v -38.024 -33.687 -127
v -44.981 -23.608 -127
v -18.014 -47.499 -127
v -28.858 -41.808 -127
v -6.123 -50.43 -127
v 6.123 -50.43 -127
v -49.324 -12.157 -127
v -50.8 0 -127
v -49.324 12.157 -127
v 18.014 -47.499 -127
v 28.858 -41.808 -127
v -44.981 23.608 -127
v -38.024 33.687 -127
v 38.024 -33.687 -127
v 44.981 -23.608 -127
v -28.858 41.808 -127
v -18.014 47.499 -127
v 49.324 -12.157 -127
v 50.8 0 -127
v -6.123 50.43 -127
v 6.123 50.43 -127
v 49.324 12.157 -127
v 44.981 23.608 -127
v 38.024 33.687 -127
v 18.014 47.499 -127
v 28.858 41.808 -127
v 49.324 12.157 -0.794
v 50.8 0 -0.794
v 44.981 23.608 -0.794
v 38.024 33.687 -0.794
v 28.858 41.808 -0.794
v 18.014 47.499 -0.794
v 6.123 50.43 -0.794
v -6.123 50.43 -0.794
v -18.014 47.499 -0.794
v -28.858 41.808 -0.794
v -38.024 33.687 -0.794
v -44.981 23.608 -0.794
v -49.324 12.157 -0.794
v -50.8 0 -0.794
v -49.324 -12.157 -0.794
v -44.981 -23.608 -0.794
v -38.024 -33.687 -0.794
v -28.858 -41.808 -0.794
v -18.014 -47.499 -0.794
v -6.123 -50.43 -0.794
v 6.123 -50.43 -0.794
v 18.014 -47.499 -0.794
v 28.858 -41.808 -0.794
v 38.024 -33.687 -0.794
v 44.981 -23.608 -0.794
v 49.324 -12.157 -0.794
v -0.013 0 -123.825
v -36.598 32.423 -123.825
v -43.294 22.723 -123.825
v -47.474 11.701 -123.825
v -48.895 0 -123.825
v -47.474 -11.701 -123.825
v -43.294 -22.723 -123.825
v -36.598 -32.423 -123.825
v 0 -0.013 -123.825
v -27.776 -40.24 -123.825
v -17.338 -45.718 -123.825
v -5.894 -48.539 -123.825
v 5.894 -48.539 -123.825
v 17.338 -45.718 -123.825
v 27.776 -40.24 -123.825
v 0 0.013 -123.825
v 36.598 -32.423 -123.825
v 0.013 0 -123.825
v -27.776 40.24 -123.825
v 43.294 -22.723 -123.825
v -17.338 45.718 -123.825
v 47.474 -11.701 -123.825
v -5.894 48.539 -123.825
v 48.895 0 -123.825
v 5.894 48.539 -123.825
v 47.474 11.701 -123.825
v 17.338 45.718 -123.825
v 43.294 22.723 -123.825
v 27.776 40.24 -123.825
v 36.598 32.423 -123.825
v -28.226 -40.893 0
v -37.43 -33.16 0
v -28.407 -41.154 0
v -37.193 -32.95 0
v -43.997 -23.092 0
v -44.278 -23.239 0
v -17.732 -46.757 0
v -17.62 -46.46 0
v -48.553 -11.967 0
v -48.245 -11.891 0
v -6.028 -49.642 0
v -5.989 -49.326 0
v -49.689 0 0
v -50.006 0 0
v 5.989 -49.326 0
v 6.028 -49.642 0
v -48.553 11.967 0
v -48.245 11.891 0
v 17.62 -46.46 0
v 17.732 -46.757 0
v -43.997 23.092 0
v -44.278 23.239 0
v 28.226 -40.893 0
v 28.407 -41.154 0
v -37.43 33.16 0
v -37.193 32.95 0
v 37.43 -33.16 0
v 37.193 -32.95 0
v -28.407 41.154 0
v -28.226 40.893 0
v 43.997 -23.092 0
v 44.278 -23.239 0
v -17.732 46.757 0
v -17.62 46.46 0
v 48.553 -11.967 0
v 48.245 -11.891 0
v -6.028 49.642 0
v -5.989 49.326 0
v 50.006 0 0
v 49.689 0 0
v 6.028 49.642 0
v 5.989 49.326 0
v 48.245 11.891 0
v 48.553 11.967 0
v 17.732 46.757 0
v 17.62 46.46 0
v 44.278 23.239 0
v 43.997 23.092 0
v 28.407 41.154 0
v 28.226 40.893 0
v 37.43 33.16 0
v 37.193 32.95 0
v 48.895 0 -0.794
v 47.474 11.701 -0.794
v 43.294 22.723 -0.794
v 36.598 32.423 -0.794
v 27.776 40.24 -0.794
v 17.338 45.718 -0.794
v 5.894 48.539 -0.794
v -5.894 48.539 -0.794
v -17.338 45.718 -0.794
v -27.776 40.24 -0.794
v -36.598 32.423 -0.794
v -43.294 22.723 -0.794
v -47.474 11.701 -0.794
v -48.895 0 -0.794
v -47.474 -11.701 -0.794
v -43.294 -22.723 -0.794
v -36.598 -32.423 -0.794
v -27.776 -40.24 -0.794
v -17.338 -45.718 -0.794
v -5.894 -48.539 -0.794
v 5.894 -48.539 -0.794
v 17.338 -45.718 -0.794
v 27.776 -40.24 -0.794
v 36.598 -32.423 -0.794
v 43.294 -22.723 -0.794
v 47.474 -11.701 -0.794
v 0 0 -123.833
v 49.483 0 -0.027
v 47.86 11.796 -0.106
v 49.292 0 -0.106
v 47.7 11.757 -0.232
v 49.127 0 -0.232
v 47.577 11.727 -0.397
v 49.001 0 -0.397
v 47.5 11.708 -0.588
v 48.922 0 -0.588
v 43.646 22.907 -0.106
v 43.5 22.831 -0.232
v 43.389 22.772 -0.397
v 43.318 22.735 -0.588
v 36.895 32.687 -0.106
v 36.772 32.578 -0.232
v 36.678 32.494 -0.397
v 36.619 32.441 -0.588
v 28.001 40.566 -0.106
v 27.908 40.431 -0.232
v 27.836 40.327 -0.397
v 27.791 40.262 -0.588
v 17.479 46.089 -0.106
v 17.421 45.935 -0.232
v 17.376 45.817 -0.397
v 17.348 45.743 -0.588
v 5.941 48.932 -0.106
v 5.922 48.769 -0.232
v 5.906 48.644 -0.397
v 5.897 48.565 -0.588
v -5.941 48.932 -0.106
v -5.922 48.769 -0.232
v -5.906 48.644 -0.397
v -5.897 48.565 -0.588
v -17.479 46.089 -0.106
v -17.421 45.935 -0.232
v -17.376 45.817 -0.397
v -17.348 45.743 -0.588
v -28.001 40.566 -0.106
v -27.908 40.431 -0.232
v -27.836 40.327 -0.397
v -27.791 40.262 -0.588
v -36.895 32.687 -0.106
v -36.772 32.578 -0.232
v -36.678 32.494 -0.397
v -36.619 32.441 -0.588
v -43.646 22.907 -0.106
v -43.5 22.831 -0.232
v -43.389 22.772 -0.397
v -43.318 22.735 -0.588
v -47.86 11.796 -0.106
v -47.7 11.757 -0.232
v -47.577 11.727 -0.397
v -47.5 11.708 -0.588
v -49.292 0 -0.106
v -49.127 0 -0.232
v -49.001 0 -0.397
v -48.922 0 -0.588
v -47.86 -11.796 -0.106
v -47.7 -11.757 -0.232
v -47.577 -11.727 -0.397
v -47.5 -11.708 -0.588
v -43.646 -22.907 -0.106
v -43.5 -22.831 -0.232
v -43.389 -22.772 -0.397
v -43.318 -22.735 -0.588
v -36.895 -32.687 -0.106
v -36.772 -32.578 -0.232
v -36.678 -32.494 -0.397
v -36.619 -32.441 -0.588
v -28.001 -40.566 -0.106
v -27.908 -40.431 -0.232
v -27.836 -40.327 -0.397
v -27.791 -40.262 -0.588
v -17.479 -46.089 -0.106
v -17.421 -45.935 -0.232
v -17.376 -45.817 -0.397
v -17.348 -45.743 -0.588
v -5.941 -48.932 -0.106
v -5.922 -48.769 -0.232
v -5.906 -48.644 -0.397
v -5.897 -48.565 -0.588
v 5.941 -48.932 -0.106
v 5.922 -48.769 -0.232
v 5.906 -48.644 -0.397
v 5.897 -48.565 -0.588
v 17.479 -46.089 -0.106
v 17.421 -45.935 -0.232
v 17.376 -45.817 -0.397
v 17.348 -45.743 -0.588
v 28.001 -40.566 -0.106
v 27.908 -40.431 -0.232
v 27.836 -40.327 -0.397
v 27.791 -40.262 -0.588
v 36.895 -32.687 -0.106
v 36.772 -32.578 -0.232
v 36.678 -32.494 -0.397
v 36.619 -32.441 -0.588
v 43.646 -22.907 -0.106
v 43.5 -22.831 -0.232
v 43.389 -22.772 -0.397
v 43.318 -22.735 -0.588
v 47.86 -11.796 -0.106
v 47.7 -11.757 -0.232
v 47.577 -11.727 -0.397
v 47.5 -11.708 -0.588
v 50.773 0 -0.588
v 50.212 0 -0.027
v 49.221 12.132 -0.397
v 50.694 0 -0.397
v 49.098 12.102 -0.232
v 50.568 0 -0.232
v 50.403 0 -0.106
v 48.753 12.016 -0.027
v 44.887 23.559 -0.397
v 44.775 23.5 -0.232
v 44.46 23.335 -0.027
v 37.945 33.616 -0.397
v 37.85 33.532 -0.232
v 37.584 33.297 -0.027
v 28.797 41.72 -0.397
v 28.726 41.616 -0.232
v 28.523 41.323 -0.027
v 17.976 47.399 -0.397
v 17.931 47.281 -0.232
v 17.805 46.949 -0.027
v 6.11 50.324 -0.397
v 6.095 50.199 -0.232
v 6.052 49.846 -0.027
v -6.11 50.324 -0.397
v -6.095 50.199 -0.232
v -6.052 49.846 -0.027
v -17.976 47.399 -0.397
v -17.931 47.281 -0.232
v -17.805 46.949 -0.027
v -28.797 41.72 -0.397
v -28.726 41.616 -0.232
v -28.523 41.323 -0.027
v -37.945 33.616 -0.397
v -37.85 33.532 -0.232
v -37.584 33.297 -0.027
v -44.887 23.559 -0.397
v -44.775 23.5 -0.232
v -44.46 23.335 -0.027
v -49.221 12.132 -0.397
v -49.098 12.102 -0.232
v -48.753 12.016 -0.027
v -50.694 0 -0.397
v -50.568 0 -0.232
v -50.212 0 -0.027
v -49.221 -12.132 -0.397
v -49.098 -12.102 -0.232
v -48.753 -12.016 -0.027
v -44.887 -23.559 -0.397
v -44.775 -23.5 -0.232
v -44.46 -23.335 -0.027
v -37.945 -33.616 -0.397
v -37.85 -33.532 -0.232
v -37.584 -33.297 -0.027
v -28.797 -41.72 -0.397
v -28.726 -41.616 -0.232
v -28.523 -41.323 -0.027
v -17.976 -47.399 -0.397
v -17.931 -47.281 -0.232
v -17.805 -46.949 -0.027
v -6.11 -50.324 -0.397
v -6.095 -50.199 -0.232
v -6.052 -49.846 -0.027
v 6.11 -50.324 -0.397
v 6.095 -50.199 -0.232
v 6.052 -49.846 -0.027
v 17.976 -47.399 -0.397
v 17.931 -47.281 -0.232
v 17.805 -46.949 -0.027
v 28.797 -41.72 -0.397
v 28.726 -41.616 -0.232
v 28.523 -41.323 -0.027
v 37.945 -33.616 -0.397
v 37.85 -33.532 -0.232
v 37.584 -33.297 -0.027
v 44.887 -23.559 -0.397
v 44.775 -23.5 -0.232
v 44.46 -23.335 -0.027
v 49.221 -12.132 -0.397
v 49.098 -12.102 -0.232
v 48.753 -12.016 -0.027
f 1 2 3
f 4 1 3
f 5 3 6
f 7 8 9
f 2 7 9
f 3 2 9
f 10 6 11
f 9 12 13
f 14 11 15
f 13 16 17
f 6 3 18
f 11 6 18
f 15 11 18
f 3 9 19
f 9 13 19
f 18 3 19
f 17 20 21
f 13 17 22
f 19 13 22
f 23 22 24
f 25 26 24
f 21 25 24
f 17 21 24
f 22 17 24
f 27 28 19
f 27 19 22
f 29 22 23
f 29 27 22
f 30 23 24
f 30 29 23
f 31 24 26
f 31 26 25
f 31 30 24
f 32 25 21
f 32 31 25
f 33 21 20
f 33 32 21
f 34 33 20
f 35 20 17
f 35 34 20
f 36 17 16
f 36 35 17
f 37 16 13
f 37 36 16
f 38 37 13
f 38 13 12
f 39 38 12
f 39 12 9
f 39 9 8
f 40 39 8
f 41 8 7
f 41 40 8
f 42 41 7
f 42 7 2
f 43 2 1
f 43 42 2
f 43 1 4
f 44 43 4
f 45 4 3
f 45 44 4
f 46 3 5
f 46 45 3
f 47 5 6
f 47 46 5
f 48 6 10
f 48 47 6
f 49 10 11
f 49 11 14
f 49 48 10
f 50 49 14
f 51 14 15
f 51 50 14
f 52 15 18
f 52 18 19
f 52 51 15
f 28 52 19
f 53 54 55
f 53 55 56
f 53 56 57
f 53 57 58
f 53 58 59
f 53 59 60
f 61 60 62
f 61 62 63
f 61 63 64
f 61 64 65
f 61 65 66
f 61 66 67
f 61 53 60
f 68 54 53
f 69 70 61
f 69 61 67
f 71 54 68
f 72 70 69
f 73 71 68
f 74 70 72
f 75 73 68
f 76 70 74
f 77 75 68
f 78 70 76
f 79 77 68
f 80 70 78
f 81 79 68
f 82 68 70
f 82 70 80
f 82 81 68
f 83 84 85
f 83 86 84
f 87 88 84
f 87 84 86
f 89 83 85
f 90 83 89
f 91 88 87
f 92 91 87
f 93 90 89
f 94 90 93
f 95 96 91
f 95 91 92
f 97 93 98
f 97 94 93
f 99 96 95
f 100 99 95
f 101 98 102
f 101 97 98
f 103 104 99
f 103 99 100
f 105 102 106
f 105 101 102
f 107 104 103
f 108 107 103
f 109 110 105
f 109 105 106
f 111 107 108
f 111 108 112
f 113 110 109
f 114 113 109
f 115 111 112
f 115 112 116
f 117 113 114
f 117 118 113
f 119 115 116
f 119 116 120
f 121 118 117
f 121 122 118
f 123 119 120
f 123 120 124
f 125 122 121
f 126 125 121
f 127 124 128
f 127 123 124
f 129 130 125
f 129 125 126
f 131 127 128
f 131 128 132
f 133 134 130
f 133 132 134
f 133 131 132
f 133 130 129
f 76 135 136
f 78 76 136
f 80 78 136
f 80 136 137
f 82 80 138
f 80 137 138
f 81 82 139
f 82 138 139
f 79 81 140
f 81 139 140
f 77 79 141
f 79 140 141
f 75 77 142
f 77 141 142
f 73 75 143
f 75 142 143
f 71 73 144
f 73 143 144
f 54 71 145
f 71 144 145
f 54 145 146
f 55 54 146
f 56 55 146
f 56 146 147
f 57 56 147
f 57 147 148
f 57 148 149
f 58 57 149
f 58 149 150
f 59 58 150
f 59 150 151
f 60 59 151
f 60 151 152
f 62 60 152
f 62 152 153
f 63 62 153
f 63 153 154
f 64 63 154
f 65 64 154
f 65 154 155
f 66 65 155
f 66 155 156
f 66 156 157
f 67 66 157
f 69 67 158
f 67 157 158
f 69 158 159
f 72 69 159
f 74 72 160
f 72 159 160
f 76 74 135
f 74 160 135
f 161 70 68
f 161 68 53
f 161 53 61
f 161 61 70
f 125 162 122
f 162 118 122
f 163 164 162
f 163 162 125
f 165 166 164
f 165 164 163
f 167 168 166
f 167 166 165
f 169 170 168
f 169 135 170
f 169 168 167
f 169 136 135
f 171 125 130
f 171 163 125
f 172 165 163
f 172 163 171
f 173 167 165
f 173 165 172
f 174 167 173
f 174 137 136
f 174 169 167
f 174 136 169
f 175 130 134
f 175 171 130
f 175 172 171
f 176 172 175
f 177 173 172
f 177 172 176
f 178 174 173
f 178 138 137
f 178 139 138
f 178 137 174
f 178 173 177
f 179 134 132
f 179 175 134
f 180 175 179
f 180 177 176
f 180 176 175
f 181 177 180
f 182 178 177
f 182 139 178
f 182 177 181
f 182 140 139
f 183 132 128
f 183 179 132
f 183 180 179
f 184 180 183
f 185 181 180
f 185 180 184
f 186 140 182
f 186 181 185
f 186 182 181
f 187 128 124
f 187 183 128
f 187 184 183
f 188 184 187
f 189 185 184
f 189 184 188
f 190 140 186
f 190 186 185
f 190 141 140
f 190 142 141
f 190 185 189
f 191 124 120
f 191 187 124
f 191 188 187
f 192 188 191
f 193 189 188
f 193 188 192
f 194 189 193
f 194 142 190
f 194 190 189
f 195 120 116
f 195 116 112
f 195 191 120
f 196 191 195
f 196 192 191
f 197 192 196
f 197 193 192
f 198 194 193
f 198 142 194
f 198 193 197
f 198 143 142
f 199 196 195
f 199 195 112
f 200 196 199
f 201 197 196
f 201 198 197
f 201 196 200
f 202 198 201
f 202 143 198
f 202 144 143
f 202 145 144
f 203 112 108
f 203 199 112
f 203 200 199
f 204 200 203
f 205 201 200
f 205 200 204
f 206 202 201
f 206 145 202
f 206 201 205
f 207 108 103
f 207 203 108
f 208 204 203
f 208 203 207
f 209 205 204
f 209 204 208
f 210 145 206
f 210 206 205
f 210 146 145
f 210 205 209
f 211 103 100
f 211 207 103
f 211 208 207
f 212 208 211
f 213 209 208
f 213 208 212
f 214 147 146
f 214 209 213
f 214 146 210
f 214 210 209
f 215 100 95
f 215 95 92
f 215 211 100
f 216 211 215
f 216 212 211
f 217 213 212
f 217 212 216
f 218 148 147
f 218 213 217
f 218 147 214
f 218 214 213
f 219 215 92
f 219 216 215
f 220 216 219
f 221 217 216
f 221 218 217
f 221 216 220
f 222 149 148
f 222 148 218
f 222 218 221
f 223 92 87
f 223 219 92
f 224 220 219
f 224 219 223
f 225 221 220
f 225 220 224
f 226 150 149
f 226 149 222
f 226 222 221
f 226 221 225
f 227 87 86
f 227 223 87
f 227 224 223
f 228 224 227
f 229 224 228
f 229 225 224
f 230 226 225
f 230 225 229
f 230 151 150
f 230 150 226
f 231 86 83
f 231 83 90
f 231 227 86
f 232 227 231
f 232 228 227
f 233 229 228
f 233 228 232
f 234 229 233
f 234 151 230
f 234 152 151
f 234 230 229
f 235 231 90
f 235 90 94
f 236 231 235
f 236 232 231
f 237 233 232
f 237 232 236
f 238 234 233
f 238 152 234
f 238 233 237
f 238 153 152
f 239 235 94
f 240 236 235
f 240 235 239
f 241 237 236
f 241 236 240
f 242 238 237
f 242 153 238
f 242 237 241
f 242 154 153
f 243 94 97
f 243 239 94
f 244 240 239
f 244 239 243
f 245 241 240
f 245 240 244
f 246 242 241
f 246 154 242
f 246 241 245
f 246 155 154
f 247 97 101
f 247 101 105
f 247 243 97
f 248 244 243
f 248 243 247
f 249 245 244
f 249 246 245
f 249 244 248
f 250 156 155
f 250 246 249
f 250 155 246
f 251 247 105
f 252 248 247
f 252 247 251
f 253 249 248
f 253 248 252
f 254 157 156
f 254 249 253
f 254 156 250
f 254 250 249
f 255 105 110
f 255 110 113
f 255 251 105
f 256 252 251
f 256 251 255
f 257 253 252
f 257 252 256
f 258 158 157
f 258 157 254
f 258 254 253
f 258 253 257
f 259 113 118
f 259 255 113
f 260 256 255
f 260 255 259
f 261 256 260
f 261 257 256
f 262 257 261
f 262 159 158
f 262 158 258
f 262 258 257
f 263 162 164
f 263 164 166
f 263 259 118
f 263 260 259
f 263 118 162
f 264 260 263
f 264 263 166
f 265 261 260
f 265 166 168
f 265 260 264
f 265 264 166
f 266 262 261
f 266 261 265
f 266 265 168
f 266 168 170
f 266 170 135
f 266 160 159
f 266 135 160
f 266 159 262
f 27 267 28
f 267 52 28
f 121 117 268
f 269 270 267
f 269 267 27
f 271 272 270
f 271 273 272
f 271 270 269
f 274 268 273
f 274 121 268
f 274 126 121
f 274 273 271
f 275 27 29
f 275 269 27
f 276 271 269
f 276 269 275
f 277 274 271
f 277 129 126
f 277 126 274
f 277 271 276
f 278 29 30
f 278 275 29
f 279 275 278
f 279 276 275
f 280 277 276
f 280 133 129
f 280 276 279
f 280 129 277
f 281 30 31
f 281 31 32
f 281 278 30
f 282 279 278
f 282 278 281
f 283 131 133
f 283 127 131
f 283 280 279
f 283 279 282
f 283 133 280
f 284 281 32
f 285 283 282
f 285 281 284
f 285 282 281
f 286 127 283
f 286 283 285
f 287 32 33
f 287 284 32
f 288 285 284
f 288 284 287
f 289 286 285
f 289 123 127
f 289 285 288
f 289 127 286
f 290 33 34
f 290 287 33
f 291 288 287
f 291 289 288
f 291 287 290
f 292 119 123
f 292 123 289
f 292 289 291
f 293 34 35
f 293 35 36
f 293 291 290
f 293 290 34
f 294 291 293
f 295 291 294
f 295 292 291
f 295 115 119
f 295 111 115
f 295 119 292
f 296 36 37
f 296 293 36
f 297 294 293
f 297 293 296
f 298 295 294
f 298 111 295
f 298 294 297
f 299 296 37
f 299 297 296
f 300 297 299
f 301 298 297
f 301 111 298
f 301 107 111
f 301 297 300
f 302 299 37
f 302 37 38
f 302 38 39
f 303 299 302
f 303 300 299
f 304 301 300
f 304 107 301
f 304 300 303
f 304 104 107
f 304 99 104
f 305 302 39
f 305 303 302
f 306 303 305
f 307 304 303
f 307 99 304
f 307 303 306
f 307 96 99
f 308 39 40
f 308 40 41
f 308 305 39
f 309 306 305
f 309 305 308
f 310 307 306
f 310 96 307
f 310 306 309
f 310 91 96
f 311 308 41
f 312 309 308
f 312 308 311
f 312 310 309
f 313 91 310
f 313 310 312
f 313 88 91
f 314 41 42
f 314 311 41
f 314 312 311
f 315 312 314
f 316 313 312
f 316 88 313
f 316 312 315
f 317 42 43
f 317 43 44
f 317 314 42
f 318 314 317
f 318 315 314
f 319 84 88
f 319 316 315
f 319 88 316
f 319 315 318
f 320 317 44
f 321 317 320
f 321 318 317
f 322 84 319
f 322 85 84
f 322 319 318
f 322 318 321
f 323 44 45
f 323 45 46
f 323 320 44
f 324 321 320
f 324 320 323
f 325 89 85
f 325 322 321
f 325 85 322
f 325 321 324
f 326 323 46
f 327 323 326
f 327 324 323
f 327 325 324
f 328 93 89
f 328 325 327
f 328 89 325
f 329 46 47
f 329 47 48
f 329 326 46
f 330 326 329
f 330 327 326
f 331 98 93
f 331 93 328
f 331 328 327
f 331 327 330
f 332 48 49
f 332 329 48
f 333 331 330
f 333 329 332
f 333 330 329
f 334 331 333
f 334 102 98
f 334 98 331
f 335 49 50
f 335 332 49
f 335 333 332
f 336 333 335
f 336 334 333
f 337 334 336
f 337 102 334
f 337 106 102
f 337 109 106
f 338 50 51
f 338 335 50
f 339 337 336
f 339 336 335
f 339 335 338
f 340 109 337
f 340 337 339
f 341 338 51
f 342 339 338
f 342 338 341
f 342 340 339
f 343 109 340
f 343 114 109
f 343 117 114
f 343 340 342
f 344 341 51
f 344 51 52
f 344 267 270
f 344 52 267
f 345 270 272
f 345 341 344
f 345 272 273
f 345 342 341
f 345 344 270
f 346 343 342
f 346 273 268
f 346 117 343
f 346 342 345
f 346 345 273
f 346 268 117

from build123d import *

# Parameters (mm, degrees)
F0_R           = 50.8
F1_DEPTH       = 127
F3_D           = 0.0254
F3_DEPTH       = 123.825
F3_CBORE_D     = 97.79
F3_CBORE_DEPTH = 123.825
F3_TIP         = 0.0076309299
F4_R           = 0.79375


with BuildPart() as f1:
    # F0 (on Top) → F1 (new body)
    with BuildSketch(Plane.XY):
        Circle(F0_R)
    extrude(amount=-F1_DEPTH)

    # F3
    with Locations(Plane.XY):
        with Locations((0, 0)):
            CounterBoreHole(F3_D / 2, F3_CBORE_D / 2, F3_CBORE_DEPTH, depth=F3_DEPTH)
            with Locations((0, 0, -(F3_DEPTH + F3_TIP / 2))):  # 118° drill point
                Cone(0, F3_D / 2, F3_TIP, mode=Mode.SUBTRACT)

    # F4
    f4_edges = [f1.edges().sort_by_distance(p)[0] for p in [
        (-50.8, 0, 0),
        (-48.895, 0, 0),
    ]]
    fillet(f4_edges, radius=F4_R)


solid = f1.part
